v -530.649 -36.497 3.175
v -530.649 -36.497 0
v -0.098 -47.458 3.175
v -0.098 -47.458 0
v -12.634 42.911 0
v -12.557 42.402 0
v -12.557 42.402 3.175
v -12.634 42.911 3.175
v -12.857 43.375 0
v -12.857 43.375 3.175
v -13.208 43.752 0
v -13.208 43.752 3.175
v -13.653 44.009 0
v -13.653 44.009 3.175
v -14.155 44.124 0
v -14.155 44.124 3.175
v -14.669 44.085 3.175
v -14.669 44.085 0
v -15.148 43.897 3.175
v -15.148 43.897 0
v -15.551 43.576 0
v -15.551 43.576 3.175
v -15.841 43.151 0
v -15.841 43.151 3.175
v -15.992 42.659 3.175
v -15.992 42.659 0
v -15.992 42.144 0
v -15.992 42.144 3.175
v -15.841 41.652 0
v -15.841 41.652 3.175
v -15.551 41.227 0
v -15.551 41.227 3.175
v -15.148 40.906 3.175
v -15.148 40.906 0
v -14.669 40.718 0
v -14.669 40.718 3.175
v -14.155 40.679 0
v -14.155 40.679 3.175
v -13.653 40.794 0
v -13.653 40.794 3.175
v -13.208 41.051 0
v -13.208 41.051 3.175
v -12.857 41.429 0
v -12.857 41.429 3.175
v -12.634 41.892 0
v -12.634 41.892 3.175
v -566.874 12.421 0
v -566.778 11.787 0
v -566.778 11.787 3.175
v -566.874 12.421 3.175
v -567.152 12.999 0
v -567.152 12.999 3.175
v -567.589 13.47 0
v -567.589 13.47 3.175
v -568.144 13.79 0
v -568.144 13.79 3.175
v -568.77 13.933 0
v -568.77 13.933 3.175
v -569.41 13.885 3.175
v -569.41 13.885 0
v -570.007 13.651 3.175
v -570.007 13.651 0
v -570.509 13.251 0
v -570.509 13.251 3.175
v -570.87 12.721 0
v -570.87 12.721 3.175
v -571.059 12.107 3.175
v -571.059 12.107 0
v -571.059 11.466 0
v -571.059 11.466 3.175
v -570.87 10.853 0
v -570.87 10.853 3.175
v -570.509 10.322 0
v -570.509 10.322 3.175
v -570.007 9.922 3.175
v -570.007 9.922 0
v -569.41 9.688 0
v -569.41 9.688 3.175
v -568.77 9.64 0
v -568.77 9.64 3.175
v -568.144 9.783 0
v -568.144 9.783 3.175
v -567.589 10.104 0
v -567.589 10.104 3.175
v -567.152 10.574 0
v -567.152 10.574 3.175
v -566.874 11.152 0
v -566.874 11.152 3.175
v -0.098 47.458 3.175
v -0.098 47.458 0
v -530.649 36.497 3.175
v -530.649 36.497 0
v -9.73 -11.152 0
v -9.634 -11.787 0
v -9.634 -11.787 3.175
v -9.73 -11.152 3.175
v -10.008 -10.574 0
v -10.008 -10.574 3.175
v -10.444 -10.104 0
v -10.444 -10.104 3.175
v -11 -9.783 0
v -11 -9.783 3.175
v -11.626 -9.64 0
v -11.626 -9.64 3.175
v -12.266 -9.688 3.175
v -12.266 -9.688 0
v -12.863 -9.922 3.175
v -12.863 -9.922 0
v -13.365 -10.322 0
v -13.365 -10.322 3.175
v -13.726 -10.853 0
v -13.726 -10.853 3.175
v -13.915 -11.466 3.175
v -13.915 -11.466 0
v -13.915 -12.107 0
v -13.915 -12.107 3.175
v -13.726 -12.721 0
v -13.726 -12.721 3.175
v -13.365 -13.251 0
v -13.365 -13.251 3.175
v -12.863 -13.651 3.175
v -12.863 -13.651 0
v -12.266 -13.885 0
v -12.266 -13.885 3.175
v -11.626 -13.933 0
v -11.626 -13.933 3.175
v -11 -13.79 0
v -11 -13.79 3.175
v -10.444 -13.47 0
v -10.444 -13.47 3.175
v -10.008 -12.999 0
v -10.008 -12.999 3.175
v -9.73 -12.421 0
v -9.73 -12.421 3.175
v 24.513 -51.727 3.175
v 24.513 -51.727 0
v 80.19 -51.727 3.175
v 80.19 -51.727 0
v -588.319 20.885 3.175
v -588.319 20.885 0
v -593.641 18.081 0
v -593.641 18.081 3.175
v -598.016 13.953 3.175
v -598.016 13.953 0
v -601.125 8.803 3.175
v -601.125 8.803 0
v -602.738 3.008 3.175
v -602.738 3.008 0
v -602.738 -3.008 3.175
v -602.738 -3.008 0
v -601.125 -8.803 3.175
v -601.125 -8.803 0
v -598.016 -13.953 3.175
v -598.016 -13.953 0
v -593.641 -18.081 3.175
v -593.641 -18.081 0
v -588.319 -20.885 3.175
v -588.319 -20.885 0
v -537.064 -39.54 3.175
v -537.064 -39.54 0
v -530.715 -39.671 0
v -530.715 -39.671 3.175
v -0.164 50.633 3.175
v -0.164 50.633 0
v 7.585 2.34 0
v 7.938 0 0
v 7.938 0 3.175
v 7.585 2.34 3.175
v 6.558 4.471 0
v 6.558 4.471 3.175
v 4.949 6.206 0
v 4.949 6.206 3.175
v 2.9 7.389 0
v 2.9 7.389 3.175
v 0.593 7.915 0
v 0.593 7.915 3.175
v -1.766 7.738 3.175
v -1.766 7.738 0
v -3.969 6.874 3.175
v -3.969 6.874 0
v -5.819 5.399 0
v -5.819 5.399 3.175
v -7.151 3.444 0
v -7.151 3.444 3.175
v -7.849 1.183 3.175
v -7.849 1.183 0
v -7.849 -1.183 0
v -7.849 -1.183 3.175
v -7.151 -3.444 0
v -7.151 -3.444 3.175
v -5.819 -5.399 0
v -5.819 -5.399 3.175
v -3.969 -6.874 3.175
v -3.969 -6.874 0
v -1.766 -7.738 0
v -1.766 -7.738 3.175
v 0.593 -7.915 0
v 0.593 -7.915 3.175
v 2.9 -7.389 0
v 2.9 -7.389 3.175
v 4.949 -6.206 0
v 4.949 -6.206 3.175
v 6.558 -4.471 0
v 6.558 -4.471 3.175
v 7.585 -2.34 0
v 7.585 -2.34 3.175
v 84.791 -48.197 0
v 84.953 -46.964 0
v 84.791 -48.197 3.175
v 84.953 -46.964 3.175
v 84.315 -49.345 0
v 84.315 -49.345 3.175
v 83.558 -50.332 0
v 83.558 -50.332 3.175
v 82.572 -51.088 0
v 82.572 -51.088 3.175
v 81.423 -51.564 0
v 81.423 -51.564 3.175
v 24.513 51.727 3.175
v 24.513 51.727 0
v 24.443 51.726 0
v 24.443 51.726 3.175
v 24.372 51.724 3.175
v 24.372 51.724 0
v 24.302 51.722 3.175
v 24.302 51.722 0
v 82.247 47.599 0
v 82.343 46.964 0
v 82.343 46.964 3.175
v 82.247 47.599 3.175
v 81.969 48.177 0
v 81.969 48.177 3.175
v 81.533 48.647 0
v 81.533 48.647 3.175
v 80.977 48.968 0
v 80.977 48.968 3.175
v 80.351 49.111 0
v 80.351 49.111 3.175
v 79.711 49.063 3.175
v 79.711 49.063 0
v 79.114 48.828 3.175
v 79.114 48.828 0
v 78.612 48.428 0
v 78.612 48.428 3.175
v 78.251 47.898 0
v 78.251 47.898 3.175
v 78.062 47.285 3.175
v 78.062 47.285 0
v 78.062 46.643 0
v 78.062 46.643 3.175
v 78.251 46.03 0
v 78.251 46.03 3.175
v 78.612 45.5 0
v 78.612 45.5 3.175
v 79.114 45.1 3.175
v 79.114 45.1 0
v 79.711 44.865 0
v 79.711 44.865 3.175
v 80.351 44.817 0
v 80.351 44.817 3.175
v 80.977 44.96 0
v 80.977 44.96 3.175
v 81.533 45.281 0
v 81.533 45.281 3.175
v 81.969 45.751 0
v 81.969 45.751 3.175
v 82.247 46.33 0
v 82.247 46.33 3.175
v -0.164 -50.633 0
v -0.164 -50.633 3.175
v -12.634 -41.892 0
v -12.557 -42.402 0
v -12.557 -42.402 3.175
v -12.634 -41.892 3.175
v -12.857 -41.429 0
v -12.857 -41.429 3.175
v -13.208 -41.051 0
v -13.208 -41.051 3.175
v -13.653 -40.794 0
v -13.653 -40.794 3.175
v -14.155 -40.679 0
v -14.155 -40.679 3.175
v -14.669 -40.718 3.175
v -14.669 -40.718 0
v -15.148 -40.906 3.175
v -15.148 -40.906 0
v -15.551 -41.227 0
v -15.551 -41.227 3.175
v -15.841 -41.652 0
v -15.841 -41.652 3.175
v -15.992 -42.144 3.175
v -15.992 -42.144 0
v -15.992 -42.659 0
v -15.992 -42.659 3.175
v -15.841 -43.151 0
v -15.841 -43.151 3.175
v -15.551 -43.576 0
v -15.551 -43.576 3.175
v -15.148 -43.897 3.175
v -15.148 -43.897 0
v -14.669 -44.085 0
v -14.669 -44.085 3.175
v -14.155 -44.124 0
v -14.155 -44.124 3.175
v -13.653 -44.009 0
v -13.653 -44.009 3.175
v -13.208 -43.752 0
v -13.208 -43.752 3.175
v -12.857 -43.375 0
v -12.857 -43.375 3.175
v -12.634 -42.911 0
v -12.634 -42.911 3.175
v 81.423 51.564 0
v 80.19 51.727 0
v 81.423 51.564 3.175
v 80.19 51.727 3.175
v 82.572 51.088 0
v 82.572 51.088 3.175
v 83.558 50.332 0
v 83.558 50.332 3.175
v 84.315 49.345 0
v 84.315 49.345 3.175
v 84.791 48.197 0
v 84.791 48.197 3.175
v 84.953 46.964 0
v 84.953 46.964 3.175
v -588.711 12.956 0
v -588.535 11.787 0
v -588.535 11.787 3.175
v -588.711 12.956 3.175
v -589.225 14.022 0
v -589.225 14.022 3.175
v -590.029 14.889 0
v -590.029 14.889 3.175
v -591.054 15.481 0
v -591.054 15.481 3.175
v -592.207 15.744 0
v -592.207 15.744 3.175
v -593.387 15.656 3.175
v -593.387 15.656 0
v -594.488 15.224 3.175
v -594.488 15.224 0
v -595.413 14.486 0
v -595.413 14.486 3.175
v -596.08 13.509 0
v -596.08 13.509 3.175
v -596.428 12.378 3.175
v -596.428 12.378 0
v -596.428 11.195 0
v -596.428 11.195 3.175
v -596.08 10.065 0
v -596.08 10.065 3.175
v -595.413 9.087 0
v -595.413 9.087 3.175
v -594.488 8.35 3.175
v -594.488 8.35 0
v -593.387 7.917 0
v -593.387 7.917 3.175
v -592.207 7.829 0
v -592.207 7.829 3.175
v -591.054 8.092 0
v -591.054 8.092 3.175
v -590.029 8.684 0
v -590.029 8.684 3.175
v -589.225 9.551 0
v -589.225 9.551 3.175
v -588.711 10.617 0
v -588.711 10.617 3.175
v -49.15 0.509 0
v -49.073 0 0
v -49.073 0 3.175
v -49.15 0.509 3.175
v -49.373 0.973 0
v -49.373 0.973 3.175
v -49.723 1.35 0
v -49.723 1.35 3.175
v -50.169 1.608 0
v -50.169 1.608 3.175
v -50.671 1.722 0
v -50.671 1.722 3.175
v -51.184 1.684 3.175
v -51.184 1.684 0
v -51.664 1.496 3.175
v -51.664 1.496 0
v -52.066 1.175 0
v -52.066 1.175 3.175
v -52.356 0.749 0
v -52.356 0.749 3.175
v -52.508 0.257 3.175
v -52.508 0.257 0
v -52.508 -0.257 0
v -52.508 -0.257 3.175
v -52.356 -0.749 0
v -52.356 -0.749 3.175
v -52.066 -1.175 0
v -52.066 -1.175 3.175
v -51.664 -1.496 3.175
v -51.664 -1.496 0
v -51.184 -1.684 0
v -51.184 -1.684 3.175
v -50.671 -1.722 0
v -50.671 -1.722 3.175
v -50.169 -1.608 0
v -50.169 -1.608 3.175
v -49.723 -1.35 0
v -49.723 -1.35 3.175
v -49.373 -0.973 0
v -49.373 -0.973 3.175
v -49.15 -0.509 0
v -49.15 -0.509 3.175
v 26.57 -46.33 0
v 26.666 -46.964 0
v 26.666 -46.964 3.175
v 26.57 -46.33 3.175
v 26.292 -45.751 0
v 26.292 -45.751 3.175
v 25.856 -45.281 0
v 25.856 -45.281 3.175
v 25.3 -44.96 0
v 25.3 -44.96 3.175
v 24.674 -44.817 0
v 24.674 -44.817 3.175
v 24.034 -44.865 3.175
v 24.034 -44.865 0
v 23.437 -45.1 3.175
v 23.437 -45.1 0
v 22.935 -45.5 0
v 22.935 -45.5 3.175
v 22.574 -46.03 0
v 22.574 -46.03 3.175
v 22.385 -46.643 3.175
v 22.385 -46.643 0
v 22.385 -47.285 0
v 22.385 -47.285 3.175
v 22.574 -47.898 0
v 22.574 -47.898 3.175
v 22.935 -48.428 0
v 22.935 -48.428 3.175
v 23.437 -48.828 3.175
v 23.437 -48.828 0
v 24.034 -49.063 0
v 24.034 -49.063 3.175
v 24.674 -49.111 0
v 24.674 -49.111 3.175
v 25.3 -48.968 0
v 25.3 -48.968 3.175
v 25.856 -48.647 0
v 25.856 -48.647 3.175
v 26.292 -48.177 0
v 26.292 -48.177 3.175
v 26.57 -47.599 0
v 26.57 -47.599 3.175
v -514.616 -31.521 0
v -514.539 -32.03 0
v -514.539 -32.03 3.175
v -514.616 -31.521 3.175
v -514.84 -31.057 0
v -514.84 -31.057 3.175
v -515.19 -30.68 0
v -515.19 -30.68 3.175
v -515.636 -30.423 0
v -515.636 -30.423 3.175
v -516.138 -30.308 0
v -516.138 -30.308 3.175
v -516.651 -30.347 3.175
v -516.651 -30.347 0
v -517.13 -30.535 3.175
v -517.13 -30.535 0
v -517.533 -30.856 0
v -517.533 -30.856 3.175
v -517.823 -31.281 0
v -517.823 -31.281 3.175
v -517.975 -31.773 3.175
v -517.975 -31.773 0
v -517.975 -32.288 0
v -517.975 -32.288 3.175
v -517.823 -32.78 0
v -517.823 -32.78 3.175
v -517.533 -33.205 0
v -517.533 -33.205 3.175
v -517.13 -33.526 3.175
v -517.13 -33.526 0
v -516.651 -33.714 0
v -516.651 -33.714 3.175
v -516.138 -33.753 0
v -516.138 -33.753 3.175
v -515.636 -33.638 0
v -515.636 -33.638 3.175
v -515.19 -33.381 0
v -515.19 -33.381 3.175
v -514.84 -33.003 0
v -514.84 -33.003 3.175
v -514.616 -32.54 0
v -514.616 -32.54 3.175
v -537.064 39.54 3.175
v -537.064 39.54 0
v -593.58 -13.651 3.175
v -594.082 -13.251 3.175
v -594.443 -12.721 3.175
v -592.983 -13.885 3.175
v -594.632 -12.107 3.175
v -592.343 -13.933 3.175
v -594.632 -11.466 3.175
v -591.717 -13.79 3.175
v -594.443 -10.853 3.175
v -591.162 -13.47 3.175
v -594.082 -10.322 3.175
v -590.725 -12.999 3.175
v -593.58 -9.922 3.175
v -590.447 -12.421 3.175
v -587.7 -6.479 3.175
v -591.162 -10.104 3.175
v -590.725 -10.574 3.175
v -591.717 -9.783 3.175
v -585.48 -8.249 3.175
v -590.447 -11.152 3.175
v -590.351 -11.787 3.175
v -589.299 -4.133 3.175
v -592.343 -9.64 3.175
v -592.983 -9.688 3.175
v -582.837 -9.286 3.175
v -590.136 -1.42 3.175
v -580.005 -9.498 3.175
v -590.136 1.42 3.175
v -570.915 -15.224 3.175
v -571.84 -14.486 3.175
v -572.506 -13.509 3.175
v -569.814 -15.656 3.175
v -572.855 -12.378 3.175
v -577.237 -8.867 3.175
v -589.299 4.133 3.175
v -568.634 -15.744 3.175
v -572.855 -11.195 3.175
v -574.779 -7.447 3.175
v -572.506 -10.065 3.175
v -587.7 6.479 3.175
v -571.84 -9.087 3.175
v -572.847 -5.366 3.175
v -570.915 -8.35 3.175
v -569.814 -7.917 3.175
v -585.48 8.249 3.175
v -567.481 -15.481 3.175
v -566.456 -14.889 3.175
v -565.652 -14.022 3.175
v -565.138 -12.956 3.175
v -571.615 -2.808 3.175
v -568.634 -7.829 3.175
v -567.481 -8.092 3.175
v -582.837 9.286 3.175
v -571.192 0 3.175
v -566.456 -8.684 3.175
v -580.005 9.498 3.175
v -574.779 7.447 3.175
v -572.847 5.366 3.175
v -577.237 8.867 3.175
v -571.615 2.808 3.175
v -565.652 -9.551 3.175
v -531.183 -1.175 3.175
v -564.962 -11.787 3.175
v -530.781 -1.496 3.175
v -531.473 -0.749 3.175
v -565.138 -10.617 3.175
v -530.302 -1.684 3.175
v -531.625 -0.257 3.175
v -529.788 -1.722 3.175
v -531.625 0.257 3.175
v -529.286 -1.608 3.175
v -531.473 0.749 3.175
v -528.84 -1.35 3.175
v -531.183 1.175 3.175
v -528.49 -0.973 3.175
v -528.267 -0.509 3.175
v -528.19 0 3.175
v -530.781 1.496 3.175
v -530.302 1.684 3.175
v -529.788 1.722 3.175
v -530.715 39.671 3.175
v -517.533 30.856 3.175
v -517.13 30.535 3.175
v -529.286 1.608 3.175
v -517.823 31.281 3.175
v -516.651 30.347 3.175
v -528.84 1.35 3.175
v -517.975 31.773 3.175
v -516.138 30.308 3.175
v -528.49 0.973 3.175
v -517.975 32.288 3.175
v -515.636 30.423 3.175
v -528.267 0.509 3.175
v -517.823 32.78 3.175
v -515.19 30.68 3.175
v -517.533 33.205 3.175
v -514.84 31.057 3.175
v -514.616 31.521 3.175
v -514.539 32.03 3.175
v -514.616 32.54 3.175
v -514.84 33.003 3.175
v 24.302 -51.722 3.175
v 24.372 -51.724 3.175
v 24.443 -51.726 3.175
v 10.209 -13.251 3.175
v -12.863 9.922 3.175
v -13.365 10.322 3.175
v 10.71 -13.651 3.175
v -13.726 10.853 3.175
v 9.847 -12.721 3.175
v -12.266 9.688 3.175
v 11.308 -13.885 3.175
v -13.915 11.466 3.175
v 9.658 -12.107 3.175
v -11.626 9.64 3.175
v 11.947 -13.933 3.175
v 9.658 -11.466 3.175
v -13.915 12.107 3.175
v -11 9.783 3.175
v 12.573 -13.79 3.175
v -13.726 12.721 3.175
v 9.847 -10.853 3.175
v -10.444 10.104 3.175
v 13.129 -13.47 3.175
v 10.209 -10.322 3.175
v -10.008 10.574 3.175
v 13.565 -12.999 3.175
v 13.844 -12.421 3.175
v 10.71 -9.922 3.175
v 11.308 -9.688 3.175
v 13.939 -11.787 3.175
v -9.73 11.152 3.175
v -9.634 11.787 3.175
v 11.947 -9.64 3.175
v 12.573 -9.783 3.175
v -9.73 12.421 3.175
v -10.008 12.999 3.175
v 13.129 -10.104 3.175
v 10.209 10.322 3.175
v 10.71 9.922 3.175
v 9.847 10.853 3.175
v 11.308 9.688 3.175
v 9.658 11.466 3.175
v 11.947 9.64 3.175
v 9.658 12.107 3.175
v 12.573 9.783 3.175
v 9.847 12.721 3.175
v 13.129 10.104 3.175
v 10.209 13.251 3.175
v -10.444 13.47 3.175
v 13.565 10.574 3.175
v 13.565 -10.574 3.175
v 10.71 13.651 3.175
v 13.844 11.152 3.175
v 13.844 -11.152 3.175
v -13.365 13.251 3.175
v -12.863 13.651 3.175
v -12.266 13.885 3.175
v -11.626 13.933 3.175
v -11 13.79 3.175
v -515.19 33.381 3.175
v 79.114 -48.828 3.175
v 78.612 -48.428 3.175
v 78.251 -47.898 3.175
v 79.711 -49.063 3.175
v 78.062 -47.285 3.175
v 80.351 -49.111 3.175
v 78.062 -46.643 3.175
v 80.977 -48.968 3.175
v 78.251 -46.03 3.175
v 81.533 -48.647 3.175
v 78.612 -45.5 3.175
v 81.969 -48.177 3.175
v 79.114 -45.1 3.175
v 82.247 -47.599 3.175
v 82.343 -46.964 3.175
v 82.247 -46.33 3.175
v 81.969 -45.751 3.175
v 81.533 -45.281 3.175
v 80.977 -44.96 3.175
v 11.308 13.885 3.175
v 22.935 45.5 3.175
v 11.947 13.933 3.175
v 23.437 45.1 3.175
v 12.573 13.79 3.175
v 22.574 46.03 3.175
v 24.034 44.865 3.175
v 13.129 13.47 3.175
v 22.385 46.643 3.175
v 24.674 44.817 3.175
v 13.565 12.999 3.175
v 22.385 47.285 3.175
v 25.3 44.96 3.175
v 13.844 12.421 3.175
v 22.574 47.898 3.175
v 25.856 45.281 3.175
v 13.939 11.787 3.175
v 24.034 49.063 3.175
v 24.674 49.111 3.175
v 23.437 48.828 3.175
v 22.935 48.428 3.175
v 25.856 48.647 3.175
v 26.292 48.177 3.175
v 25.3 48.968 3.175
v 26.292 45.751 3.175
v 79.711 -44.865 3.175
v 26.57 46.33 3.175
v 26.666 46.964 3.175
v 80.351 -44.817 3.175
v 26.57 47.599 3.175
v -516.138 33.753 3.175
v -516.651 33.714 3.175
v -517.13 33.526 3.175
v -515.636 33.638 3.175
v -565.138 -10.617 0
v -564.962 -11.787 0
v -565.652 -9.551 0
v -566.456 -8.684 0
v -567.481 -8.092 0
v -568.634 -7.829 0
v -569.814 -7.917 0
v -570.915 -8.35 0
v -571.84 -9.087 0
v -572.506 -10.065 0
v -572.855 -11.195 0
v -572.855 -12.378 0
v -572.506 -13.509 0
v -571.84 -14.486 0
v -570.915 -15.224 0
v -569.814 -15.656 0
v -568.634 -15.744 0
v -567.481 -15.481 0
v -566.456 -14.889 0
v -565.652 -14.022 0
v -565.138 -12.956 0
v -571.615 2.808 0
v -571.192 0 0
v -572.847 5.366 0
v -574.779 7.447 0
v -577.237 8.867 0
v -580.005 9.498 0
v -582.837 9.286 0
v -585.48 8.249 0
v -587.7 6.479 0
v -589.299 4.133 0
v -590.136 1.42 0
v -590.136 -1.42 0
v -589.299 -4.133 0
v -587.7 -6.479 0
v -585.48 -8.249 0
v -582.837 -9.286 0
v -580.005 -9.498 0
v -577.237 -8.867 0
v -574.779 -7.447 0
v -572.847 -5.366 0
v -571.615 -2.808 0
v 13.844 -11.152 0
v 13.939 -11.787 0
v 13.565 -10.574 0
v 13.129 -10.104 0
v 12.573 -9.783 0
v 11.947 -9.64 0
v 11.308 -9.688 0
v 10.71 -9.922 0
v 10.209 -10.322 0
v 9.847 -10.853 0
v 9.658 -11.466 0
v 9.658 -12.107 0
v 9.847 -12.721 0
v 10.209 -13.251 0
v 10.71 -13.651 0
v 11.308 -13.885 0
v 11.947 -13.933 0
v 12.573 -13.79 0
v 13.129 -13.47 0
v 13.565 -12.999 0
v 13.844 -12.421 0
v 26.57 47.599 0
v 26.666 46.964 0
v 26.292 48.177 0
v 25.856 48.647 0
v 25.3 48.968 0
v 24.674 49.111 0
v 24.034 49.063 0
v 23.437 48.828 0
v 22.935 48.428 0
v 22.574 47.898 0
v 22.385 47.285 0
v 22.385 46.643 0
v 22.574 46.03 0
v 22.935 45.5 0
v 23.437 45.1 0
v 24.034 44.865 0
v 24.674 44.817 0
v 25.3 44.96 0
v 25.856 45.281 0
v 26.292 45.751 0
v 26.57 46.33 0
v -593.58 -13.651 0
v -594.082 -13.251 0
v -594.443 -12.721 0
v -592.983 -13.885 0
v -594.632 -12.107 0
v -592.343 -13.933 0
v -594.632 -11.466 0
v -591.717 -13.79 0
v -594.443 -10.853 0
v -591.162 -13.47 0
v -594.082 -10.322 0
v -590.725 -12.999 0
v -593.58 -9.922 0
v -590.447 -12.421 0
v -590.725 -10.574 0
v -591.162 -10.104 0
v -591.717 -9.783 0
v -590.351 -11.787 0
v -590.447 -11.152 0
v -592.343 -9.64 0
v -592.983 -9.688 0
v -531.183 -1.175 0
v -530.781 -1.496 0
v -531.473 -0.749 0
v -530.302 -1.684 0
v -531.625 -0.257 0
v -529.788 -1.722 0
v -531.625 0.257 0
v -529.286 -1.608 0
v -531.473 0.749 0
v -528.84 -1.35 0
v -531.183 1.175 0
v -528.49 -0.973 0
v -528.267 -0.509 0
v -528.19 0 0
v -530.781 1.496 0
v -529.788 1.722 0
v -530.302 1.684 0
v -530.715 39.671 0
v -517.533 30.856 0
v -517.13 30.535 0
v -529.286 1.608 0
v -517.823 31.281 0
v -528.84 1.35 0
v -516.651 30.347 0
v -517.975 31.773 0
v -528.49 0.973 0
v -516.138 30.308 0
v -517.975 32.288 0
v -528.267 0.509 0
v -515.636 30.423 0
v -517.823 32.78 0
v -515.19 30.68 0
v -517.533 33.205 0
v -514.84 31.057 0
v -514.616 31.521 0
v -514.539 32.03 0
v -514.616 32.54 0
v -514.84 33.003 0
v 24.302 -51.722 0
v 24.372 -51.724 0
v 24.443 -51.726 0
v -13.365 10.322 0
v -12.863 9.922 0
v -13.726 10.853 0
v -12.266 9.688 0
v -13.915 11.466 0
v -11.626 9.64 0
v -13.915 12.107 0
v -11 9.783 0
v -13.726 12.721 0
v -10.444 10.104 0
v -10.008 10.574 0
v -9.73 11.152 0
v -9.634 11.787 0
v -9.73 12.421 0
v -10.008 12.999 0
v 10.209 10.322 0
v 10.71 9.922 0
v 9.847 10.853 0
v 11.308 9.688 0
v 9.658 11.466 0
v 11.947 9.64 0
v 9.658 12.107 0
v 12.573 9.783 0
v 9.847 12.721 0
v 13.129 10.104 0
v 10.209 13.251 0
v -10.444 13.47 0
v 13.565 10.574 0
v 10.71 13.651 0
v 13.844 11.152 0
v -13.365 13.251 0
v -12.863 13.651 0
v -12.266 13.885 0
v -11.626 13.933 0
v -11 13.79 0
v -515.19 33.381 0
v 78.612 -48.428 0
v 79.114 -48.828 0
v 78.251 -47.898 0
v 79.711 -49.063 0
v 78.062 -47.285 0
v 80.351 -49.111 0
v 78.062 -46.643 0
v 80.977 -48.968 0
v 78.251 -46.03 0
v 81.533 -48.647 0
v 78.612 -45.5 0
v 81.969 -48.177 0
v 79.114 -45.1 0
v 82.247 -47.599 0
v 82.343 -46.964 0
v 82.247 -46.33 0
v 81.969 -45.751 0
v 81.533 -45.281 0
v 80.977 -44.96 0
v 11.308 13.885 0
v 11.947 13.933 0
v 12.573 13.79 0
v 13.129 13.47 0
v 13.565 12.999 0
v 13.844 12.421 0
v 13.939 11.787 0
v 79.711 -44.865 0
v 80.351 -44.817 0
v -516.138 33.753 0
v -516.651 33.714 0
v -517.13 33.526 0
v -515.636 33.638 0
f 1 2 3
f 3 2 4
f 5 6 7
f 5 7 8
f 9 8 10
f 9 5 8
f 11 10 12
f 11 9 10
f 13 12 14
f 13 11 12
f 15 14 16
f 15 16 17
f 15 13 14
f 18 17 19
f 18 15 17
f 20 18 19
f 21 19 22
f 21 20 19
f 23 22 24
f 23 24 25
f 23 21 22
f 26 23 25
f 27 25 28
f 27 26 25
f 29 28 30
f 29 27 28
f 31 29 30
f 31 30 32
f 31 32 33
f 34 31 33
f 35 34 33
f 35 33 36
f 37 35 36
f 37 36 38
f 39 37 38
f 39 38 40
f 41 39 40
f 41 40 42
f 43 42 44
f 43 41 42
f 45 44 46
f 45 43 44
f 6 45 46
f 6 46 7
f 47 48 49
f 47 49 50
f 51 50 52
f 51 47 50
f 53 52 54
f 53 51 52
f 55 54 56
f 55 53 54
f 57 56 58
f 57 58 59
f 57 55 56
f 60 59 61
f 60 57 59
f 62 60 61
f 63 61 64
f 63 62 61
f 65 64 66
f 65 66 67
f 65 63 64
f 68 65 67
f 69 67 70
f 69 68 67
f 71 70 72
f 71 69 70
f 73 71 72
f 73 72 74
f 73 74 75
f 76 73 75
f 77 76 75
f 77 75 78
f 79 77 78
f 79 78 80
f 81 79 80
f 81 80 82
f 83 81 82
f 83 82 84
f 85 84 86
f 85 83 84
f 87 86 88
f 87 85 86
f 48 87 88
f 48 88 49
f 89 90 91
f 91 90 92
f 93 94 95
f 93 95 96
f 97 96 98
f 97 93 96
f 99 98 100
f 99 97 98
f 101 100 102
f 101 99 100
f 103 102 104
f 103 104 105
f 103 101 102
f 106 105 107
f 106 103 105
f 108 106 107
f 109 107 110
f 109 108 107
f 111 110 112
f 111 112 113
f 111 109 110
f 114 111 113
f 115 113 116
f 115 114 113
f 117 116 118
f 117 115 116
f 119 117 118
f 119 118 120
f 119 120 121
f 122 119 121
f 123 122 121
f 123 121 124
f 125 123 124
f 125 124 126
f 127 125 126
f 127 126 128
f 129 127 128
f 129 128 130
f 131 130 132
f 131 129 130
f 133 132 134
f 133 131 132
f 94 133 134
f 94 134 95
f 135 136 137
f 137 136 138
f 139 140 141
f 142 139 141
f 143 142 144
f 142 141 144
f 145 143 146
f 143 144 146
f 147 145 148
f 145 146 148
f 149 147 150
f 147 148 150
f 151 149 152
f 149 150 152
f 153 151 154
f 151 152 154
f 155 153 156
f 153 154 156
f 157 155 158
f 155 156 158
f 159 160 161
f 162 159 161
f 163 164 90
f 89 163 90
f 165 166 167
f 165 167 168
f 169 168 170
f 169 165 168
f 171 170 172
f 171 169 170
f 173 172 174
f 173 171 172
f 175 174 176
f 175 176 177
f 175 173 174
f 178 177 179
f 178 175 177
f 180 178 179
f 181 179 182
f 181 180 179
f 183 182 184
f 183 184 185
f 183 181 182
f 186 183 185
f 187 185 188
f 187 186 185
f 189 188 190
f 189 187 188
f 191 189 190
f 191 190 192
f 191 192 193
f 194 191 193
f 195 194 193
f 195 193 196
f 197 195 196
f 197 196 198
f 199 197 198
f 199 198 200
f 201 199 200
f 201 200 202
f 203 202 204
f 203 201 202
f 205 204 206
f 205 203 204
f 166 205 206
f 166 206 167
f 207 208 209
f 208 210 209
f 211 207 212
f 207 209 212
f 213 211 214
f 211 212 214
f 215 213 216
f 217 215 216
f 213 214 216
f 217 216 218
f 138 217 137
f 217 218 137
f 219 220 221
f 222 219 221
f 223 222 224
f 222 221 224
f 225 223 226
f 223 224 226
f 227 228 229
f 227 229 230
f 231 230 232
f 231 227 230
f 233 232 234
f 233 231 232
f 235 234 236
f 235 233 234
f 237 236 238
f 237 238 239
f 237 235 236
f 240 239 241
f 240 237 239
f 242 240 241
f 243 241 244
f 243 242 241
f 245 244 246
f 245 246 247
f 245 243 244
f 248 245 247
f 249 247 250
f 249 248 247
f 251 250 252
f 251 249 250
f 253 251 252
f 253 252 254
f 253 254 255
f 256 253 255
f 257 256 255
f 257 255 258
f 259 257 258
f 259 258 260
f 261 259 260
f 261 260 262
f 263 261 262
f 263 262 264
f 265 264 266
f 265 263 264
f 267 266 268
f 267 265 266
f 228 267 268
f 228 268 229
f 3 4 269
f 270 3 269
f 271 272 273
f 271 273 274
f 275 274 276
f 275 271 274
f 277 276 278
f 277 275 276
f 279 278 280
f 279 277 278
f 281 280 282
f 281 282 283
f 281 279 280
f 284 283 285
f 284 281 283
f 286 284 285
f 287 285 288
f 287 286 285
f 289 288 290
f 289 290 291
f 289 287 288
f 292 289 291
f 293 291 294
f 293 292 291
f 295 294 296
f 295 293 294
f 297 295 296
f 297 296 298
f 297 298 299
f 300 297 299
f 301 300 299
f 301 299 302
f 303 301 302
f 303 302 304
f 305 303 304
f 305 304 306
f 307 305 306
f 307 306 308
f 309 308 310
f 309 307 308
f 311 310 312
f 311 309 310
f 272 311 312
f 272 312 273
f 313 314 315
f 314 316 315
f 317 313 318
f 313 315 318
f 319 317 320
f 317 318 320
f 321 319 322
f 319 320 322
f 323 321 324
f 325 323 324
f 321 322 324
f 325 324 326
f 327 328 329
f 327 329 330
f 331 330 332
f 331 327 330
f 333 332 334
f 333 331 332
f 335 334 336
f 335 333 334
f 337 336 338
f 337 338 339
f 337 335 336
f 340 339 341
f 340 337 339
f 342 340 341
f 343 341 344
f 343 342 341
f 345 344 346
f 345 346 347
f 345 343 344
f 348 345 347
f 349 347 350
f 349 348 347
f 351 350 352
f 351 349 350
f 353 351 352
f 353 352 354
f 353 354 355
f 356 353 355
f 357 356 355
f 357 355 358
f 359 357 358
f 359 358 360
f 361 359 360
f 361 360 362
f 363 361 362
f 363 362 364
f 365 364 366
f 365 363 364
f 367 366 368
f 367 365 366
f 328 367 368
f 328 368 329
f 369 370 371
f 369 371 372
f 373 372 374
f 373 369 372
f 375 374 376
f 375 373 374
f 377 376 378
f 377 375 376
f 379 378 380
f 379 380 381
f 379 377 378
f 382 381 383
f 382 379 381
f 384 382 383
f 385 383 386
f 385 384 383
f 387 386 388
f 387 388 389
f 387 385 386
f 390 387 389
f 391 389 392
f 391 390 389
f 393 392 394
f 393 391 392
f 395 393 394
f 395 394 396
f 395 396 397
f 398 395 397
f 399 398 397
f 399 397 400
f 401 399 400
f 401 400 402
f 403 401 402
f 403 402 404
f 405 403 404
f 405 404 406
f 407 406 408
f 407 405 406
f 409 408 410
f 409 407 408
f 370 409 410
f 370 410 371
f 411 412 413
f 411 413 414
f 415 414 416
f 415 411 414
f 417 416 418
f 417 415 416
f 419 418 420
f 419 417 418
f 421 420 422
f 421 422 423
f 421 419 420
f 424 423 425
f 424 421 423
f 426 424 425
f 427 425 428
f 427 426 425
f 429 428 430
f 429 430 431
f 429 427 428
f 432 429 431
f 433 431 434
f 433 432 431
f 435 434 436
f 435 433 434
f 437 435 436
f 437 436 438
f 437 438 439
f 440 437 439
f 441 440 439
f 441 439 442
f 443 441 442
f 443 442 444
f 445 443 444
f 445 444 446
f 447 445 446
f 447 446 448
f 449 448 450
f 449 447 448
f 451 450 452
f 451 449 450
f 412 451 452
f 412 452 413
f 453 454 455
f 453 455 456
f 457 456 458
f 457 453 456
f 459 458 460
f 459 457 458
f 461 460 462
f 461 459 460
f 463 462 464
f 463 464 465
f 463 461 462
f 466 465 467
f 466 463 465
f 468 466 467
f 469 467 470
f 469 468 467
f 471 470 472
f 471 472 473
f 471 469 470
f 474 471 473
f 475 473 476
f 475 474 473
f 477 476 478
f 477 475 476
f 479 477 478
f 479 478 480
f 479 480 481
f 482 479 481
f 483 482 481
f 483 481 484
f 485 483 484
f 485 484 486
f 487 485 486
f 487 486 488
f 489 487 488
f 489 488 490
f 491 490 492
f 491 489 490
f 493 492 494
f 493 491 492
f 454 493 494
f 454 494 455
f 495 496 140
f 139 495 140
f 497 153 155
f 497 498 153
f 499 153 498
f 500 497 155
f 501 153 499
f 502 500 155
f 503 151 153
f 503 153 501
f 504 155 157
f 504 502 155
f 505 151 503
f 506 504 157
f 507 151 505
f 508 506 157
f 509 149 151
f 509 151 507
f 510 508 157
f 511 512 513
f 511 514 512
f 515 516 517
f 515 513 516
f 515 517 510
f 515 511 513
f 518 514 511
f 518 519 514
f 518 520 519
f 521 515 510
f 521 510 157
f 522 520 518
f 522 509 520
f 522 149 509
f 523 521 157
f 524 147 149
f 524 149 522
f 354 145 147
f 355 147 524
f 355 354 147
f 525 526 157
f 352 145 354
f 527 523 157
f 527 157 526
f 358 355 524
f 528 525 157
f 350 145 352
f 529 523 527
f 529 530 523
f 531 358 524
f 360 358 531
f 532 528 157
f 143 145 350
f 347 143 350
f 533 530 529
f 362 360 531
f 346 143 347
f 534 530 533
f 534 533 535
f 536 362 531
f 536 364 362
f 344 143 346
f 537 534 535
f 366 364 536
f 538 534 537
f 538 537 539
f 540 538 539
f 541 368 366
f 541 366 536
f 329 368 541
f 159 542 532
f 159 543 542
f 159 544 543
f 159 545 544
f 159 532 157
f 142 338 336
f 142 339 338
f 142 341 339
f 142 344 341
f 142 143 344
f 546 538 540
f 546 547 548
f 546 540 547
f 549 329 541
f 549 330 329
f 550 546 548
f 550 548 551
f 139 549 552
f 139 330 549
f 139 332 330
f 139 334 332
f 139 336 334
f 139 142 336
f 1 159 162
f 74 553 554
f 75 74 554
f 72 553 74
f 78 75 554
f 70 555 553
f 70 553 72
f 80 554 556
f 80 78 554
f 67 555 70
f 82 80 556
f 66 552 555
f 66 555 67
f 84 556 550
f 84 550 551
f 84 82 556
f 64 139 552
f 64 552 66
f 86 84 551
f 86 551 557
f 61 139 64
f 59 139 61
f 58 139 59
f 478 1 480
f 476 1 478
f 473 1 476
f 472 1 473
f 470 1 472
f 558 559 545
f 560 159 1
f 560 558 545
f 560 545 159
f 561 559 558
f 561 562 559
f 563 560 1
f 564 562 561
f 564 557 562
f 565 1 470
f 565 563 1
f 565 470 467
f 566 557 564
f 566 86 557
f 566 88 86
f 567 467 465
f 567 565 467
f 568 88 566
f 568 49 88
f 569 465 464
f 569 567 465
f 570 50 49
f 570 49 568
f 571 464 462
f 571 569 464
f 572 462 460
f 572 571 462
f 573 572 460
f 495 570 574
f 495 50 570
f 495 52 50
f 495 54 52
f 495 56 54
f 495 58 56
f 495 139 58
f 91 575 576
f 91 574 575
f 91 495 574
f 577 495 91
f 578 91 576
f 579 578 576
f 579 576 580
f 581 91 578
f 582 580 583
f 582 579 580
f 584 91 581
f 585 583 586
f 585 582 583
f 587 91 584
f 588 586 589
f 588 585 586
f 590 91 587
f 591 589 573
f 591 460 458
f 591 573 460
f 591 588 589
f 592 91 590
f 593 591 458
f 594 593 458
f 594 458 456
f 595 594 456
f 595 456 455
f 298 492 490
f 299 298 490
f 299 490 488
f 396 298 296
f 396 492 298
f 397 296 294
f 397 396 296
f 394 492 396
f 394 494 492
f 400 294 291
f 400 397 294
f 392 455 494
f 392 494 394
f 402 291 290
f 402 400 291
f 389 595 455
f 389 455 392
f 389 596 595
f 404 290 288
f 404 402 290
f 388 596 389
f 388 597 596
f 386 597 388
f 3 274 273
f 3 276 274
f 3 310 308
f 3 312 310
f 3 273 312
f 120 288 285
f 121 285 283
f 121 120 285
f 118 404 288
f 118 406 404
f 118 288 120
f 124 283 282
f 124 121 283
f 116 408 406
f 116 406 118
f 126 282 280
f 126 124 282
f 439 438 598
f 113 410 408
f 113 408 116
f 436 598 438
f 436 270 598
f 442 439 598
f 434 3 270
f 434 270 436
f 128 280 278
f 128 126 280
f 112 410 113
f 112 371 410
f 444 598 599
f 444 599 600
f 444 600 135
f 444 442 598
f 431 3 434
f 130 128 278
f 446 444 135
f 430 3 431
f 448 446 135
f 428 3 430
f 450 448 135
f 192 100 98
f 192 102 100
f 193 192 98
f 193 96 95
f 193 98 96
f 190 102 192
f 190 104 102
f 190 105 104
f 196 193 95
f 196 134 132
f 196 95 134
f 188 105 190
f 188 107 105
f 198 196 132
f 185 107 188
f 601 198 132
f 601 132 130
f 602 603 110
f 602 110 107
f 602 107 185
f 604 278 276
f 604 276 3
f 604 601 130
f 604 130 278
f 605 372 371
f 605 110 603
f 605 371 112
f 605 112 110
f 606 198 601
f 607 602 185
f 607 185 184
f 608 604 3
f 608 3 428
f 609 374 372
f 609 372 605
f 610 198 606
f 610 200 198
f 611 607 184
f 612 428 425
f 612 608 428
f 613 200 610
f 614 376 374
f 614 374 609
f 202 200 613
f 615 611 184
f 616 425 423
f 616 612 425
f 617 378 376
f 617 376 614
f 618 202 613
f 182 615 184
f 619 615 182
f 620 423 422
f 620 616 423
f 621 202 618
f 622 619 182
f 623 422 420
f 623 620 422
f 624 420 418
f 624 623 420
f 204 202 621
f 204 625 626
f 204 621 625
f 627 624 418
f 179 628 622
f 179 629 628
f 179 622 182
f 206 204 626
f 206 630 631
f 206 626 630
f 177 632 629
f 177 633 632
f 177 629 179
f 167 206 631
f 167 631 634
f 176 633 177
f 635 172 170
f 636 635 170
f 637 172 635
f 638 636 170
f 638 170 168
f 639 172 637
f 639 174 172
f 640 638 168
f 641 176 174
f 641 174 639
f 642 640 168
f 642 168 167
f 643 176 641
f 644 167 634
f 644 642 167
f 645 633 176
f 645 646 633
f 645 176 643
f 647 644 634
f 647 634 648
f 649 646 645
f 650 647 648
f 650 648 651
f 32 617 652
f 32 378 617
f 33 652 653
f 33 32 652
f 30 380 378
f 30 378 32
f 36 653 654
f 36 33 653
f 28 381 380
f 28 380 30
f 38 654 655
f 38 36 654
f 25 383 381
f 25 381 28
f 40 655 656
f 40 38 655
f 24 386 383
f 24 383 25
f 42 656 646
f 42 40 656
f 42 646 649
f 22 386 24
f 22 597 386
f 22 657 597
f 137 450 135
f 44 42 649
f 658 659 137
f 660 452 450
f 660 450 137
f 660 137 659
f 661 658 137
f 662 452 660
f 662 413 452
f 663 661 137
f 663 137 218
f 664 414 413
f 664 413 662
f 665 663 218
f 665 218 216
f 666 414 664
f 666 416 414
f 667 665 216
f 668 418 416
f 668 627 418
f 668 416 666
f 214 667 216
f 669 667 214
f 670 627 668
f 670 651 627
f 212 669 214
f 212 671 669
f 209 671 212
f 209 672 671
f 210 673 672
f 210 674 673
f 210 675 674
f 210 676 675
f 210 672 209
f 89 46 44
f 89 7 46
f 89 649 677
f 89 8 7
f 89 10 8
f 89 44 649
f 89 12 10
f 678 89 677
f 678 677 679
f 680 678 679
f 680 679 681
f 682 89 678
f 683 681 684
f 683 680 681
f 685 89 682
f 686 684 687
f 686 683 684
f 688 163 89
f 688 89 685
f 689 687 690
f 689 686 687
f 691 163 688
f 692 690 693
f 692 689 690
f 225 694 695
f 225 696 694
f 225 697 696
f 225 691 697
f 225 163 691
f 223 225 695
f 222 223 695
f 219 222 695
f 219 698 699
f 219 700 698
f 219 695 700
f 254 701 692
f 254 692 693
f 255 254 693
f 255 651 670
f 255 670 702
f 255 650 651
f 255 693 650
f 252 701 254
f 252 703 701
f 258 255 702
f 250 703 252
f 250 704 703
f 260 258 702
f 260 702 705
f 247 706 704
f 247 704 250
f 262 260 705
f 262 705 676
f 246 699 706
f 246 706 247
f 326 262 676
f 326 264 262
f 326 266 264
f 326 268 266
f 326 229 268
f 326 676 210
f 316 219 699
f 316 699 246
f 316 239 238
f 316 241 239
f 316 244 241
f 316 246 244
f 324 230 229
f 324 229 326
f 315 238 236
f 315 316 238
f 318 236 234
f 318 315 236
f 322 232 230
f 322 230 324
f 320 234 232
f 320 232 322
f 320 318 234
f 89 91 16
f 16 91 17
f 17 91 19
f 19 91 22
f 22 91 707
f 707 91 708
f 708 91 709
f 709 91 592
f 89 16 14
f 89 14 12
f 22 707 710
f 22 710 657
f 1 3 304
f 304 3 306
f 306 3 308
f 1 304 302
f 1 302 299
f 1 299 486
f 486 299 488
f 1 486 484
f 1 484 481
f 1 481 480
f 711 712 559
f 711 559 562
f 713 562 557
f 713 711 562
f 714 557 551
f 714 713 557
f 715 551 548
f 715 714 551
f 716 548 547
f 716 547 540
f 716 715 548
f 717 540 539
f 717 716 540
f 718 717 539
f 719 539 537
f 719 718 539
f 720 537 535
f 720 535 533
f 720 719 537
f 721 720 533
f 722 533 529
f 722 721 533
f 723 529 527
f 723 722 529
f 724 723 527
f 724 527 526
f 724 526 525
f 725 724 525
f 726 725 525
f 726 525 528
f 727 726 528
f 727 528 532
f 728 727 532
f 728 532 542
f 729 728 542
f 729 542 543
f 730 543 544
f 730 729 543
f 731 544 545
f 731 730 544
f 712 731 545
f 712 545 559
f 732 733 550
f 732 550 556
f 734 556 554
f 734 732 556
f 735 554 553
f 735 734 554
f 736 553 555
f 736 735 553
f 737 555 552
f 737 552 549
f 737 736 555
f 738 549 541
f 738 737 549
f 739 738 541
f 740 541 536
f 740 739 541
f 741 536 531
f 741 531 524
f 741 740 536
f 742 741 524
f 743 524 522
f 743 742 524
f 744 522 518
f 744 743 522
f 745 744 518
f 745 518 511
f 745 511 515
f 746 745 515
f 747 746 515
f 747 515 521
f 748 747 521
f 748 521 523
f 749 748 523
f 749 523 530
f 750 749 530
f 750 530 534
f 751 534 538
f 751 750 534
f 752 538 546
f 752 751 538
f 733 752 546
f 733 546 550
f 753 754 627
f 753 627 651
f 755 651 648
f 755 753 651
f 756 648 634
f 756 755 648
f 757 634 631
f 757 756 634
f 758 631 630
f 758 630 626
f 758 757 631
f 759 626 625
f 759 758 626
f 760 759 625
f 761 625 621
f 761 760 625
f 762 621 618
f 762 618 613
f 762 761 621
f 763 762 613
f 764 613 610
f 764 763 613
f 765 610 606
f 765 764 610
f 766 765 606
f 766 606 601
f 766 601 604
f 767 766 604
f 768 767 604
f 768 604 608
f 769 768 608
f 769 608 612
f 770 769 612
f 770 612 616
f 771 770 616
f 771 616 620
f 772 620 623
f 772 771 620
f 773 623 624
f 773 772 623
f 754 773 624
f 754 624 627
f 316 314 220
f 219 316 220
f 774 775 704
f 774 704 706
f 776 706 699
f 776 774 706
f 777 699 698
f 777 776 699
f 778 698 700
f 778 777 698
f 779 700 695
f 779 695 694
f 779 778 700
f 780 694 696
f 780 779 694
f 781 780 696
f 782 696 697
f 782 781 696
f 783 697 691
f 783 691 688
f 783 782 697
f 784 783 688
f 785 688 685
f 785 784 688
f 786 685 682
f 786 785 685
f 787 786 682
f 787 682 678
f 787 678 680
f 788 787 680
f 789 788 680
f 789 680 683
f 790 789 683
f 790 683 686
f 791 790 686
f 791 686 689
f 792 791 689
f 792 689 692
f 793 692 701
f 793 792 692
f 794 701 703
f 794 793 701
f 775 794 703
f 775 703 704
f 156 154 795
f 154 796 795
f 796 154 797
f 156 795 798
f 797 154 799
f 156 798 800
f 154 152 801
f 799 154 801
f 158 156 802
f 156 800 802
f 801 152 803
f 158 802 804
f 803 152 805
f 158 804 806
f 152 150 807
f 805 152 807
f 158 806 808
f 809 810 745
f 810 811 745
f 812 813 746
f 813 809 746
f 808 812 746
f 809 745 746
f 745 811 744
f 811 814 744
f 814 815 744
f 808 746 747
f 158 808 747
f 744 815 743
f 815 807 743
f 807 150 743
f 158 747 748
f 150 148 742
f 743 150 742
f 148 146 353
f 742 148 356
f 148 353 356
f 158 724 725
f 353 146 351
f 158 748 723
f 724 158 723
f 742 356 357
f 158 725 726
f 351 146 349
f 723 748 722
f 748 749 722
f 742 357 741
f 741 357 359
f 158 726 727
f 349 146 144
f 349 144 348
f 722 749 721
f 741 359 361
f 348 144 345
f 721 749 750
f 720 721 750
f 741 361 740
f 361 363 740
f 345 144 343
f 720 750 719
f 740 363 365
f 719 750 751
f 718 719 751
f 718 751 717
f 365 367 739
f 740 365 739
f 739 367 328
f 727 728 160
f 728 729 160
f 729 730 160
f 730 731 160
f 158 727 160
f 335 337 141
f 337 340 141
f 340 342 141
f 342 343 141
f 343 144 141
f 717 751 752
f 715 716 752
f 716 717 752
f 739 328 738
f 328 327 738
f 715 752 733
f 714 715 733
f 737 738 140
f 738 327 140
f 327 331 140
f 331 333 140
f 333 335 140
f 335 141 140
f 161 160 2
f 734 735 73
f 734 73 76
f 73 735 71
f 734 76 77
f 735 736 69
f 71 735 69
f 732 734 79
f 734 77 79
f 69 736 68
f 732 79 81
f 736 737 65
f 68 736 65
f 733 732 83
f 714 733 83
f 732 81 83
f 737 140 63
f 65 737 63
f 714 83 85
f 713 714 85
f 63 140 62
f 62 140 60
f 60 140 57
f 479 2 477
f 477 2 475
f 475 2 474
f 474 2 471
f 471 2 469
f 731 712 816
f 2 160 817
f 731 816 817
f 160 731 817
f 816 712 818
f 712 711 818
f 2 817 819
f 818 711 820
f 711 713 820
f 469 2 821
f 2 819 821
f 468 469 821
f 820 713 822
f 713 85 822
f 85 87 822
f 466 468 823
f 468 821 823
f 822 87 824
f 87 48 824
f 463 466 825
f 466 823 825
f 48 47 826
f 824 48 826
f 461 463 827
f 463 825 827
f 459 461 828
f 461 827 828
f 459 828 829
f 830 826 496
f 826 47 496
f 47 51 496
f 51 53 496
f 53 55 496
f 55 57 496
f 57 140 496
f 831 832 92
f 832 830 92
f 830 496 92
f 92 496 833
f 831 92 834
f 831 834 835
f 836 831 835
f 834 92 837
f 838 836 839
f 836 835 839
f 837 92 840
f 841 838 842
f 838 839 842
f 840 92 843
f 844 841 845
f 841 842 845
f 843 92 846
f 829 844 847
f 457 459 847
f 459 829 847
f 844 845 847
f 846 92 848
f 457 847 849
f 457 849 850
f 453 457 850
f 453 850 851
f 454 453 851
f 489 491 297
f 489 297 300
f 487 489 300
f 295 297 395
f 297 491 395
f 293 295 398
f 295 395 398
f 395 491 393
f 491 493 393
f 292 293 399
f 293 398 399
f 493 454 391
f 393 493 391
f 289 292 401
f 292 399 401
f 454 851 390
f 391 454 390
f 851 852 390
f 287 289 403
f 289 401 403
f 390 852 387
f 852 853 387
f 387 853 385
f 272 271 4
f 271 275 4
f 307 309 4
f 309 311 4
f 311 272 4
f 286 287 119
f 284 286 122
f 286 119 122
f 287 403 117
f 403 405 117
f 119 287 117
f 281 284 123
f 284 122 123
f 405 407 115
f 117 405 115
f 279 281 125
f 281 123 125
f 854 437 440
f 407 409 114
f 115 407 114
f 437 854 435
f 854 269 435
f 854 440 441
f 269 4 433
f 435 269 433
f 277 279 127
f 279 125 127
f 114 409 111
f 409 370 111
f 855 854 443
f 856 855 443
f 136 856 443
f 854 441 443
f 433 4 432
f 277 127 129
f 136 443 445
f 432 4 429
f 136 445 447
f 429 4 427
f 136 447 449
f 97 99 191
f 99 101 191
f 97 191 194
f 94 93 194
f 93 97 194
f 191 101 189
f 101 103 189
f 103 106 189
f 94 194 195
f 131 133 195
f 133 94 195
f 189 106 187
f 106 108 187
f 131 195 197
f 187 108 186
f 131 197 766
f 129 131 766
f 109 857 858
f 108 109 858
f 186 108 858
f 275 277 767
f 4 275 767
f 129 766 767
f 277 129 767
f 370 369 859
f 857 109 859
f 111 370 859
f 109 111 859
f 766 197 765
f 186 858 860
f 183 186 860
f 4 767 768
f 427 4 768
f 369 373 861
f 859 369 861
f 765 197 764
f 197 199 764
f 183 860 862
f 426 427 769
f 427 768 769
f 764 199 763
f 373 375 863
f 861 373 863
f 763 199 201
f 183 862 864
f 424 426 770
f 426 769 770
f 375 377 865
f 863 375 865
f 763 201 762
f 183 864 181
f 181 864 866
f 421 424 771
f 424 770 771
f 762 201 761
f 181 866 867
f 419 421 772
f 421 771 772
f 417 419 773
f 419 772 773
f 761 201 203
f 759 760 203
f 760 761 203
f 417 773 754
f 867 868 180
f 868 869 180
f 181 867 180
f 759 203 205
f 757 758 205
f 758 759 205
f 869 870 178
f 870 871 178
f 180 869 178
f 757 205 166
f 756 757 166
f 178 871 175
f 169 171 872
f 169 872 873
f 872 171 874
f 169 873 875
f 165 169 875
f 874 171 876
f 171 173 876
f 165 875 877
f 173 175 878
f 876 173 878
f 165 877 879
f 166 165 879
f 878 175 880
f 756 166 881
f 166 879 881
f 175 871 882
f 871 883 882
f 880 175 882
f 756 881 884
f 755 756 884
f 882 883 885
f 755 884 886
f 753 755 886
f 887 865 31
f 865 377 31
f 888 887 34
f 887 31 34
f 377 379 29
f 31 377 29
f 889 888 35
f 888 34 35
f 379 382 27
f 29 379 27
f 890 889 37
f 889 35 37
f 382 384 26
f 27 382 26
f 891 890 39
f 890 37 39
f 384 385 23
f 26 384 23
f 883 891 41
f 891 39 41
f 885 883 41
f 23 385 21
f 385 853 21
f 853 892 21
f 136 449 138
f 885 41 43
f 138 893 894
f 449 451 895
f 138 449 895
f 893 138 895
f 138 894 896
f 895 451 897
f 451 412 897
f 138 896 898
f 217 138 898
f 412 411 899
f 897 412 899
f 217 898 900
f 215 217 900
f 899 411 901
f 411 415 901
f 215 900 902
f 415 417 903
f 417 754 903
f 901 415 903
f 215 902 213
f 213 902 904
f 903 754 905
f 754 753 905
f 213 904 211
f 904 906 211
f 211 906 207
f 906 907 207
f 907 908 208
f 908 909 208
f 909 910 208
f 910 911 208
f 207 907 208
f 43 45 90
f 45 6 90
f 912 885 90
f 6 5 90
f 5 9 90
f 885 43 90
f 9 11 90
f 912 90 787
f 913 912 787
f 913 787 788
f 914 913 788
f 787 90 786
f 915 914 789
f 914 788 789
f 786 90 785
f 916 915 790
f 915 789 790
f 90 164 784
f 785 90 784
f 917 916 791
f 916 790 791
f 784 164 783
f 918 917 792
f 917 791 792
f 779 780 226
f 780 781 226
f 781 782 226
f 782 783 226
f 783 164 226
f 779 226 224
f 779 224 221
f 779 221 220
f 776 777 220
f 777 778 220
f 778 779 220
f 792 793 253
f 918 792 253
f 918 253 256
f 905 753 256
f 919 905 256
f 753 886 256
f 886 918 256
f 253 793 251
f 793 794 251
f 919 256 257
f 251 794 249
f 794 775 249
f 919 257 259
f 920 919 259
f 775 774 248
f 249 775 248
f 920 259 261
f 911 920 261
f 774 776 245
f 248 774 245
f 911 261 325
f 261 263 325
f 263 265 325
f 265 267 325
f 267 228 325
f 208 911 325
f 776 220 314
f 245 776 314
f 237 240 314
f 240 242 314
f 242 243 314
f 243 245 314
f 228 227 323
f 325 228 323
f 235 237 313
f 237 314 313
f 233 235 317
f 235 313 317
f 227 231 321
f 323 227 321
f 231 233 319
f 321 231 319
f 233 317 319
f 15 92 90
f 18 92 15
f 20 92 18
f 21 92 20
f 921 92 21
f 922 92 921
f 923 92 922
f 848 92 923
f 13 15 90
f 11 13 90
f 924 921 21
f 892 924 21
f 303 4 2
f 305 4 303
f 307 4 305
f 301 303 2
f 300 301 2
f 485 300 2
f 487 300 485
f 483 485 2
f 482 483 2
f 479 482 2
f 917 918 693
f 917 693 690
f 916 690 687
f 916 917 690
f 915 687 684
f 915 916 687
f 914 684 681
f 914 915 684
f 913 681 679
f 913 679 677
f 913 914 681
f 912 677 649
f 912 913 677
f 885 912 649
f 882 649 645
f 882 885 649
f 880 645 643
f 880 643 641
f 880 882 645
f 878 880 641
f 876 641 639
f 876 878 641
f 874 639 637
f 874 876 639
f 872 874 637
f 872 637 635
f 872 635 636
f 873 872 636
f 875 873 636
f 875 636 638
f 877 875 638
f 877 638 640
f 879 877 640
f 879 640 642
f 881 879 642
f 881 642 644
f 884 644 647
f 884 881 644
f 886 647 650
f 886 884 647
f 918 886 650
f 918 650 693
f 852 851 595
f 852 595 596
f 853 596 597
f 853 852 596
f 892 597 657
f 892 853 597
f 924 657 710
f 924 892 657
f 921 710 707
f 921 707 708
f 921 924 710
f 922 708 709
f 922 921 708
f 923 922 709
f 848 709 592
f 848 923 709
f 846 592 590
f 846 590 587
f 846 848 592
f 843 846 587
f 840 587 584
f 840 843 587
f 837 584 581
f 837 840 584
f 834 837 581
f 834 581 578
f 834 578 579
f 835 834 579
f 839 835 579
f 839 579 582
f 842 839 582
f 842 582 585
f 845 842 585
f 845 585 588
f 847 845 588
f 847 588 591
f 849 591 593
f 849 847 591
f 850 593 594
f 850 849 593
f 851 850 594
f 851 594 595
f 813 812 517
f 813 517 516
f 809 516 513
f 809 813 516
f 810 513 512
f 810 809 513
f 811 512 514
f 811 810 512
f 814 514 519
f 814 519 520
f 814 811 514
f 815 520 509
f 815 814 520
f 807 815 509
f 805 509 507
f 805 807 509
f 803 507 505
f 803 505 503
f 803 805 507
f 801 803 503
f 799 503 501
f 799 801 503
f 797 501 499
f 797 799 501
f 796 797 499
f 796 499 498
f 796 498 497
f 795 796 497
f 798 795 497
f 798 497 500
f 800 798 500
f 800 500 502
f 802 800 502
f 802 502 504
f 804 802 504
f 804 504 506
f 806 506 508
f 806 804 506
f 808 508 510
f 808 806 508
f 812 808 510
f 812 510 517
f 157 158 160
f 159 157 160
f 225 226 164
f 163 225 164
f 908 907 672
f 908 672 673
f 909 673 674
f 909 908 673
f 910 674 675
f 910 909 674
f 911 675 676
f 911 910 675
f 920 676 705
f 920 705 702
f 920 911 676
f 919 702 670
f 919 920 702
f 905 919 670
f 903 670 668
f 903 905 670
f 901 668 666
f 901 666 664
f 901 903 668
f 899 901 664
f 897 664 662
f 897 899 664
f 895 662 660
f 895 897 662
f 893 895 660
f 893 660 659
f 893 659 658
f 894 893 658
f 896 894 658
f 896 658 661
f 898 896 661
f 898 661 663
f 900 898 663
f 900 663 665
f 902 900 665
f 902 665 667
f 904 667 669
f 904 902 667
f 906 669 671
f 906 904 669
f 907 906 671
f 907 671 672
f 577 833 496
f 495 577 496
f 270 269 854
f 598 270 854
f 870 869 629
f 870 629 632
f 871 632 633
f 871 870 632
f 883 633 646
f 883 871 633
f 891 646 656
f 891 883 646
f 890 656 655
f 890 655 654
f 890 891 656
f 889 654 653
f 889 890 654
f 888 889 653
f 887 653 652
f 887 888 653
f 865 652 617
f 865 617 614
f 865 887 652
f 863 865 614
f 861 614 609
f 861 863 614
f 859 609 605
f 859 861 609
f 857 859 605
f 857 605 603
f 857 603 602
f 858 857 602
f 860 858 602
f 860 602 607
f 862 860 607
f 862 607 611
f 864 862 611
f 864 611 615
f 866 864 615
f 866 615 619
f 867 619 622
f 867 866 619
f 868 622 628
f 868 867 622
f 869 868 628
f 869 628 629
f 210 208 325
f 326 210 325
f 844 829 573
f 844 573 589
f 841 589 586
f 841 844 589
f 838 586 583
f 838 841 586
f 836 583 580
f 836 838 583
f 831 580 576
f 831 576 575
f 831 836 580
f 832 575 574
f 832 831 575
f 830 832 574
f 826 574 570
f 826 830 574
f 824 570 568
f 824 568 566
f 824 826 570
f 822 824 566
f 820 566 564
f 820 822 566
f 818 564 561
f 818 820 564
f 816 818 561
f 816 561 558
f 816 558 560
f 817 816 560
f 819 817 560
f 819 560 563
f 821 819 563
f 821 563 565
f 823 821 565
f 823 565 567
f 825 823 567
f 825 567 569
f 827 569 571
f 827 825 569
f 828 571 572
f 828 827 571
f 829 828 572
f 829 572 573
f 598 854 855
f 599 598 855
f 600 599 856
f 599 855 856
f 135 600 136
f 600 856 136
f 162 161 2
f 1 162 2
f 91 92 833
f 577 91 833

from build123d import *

# Parameters (mm, degrees)
F0_R     = 1.7272
F0_R_2   = 2.15265
F0_R_3   = 3.96875
F0_R_4   = 9.525
F0_R_5   = 7.9375
F1_DEPTH = 3.175
F2_R     = 4.7625


with BuildPart() as f1:
    # F0 (on Top) → F1 (new body)
    with BuildSketch(Plane.XY):
        with BuildLine():
            Line((-537.063671, 39.539974), (-588.318702, 20.884668))
            ThreePointArc((-588.318702, 20.884668), (-602.942304, 0), (-588.318702, -20.884668))
            Line((-588.318702, -20.884668), (-537.063671, -39.539974))
            Line((-537.063671, -39.539974), (-530.715026, -39.671139))
            Line((-530.715026, -39.671139), (-530.649444, -36.496817))
            Line((-530.649444, -36.496817), (-0.098374, -47.458199))
            Line((-0.098374, -47.458199), (-0.163957, -50.632521))
            Line((-0.163957, -50.632521), (24.301577, -51.721828))
            ThreePointArc((24.301577, -51.721828), (24.407469, -51.725363), (24.513413, -51.726541))
            Line((24.513413, -51.726541), (84.952916, -51.726541))
            Line((84.952916, -51.726541), (84.952916, 51.726541))
            Line((84.952916, 51.726541), (24.513413, 51.726541))
            ThreePointArc((24.513413, 51.726541), (24.407469, 51.725363), (24.301577, 51.721828))
            Line((24.301577, 51.721828), (-0.163957, 50.632521))
            Line((-0.163957, 50.632521), (-0.098374, 47.458199))
            Line((-0.098374, 47.458199), (-530.649444, 36.496817))
            Line((-530.649444, 36.496817), (-530.715026, 39.671139))
            Line((-530.715026, 39.671139), (-537.063671, 39.539974))
        make_face()
        with Locations((-516.266618, -32.030455)):
            Circle(F0_R, mode=Mode.SUBTRACT)
        with Locations((-592.503891, -11.786586)):
            Circle(F0_R_2, mode=Mode.SUBTRACT)
        with Locations((-568.930718, -11.786586)):
            Circle(F0_R_3, mode=Mode.SUBTRACT)
        with Locations((-14.284452, -42.401593)):
            Circle(F0_R, mode=Mode.SUBTRACT)
        with Locations((24.513413, -46.964041)):
            Circle(F0_R_2, mode=Mode.SUBTRACT)
        with Locations((80.190416, -46.964041)):
            Circle(F0_R_2, mode=Mode.SUBTRACT)
        with Locations((-11.786586, -11.786586)):
            Circle(F0_R_2, mode=Mode.SUBTRACT)
        with Locations((11.786586, -11.786586)):
            Circle(F0_R_2, mode=Mode.SUBTRACT)
        with Locations((-580.717304, 0)):
            Circle(F0_R_4, mode=Mode.SUBTRACT)
        with Locations((-529.917304, 0)):
            Circle(F0_R, mode=Mode.SUBTRACT)
        with Locations((-592.503891, 11.786586)):
            Circle(F0_R_3, mode=Mode.SUBTRACT)
        with Locations((-568.930718, 11.786586)):
            Circle(F0_R_2, mode=Mode.SUBTRACT)
        with Locations((-516.266618, 32.030455)):
            Circle(F0_R, mode=Mode.SUBTRACT)
        with Locations((-50.8, 0)):
            Circle(F0_R, mode=Mode.SUBTRACT)
        with Locations((-11.786586, 11.786586)):
            Circle(F0_R_2, mode=Mode.SUBTRACT)
        Circle(F0_R_5, mode=Mode.SUBTRACT)
        with Locations((11.786586, 11.786586)):
            Circle(F0_R_2, mode=Mode.SUBTRACT)
        with Locations((-14.284452, 42.401593)):
            Circle(F0_R, mode=Mode.SUBTRACT)
        with Locations((24.513413, 46.964041)):
            Circle(F0_R_2, mode=Mode.SUBTRACT)
        with Locations((80.190416, 46.964041)):
            Circle(F0_R_2, mode=Mode.SUBTRACT)
    extrude(amount=F1_DEPTH)

    # F2
    f2_edges = [f1.edges().sort_by_distance(p)[0] for p in [
        (84.952916, 51.726541, 1.5875),
        (84.952916, -51.726541, 1.5875),
    ]]
    fillet(f2_edges, radius=F2_R)


solid = f1.part
